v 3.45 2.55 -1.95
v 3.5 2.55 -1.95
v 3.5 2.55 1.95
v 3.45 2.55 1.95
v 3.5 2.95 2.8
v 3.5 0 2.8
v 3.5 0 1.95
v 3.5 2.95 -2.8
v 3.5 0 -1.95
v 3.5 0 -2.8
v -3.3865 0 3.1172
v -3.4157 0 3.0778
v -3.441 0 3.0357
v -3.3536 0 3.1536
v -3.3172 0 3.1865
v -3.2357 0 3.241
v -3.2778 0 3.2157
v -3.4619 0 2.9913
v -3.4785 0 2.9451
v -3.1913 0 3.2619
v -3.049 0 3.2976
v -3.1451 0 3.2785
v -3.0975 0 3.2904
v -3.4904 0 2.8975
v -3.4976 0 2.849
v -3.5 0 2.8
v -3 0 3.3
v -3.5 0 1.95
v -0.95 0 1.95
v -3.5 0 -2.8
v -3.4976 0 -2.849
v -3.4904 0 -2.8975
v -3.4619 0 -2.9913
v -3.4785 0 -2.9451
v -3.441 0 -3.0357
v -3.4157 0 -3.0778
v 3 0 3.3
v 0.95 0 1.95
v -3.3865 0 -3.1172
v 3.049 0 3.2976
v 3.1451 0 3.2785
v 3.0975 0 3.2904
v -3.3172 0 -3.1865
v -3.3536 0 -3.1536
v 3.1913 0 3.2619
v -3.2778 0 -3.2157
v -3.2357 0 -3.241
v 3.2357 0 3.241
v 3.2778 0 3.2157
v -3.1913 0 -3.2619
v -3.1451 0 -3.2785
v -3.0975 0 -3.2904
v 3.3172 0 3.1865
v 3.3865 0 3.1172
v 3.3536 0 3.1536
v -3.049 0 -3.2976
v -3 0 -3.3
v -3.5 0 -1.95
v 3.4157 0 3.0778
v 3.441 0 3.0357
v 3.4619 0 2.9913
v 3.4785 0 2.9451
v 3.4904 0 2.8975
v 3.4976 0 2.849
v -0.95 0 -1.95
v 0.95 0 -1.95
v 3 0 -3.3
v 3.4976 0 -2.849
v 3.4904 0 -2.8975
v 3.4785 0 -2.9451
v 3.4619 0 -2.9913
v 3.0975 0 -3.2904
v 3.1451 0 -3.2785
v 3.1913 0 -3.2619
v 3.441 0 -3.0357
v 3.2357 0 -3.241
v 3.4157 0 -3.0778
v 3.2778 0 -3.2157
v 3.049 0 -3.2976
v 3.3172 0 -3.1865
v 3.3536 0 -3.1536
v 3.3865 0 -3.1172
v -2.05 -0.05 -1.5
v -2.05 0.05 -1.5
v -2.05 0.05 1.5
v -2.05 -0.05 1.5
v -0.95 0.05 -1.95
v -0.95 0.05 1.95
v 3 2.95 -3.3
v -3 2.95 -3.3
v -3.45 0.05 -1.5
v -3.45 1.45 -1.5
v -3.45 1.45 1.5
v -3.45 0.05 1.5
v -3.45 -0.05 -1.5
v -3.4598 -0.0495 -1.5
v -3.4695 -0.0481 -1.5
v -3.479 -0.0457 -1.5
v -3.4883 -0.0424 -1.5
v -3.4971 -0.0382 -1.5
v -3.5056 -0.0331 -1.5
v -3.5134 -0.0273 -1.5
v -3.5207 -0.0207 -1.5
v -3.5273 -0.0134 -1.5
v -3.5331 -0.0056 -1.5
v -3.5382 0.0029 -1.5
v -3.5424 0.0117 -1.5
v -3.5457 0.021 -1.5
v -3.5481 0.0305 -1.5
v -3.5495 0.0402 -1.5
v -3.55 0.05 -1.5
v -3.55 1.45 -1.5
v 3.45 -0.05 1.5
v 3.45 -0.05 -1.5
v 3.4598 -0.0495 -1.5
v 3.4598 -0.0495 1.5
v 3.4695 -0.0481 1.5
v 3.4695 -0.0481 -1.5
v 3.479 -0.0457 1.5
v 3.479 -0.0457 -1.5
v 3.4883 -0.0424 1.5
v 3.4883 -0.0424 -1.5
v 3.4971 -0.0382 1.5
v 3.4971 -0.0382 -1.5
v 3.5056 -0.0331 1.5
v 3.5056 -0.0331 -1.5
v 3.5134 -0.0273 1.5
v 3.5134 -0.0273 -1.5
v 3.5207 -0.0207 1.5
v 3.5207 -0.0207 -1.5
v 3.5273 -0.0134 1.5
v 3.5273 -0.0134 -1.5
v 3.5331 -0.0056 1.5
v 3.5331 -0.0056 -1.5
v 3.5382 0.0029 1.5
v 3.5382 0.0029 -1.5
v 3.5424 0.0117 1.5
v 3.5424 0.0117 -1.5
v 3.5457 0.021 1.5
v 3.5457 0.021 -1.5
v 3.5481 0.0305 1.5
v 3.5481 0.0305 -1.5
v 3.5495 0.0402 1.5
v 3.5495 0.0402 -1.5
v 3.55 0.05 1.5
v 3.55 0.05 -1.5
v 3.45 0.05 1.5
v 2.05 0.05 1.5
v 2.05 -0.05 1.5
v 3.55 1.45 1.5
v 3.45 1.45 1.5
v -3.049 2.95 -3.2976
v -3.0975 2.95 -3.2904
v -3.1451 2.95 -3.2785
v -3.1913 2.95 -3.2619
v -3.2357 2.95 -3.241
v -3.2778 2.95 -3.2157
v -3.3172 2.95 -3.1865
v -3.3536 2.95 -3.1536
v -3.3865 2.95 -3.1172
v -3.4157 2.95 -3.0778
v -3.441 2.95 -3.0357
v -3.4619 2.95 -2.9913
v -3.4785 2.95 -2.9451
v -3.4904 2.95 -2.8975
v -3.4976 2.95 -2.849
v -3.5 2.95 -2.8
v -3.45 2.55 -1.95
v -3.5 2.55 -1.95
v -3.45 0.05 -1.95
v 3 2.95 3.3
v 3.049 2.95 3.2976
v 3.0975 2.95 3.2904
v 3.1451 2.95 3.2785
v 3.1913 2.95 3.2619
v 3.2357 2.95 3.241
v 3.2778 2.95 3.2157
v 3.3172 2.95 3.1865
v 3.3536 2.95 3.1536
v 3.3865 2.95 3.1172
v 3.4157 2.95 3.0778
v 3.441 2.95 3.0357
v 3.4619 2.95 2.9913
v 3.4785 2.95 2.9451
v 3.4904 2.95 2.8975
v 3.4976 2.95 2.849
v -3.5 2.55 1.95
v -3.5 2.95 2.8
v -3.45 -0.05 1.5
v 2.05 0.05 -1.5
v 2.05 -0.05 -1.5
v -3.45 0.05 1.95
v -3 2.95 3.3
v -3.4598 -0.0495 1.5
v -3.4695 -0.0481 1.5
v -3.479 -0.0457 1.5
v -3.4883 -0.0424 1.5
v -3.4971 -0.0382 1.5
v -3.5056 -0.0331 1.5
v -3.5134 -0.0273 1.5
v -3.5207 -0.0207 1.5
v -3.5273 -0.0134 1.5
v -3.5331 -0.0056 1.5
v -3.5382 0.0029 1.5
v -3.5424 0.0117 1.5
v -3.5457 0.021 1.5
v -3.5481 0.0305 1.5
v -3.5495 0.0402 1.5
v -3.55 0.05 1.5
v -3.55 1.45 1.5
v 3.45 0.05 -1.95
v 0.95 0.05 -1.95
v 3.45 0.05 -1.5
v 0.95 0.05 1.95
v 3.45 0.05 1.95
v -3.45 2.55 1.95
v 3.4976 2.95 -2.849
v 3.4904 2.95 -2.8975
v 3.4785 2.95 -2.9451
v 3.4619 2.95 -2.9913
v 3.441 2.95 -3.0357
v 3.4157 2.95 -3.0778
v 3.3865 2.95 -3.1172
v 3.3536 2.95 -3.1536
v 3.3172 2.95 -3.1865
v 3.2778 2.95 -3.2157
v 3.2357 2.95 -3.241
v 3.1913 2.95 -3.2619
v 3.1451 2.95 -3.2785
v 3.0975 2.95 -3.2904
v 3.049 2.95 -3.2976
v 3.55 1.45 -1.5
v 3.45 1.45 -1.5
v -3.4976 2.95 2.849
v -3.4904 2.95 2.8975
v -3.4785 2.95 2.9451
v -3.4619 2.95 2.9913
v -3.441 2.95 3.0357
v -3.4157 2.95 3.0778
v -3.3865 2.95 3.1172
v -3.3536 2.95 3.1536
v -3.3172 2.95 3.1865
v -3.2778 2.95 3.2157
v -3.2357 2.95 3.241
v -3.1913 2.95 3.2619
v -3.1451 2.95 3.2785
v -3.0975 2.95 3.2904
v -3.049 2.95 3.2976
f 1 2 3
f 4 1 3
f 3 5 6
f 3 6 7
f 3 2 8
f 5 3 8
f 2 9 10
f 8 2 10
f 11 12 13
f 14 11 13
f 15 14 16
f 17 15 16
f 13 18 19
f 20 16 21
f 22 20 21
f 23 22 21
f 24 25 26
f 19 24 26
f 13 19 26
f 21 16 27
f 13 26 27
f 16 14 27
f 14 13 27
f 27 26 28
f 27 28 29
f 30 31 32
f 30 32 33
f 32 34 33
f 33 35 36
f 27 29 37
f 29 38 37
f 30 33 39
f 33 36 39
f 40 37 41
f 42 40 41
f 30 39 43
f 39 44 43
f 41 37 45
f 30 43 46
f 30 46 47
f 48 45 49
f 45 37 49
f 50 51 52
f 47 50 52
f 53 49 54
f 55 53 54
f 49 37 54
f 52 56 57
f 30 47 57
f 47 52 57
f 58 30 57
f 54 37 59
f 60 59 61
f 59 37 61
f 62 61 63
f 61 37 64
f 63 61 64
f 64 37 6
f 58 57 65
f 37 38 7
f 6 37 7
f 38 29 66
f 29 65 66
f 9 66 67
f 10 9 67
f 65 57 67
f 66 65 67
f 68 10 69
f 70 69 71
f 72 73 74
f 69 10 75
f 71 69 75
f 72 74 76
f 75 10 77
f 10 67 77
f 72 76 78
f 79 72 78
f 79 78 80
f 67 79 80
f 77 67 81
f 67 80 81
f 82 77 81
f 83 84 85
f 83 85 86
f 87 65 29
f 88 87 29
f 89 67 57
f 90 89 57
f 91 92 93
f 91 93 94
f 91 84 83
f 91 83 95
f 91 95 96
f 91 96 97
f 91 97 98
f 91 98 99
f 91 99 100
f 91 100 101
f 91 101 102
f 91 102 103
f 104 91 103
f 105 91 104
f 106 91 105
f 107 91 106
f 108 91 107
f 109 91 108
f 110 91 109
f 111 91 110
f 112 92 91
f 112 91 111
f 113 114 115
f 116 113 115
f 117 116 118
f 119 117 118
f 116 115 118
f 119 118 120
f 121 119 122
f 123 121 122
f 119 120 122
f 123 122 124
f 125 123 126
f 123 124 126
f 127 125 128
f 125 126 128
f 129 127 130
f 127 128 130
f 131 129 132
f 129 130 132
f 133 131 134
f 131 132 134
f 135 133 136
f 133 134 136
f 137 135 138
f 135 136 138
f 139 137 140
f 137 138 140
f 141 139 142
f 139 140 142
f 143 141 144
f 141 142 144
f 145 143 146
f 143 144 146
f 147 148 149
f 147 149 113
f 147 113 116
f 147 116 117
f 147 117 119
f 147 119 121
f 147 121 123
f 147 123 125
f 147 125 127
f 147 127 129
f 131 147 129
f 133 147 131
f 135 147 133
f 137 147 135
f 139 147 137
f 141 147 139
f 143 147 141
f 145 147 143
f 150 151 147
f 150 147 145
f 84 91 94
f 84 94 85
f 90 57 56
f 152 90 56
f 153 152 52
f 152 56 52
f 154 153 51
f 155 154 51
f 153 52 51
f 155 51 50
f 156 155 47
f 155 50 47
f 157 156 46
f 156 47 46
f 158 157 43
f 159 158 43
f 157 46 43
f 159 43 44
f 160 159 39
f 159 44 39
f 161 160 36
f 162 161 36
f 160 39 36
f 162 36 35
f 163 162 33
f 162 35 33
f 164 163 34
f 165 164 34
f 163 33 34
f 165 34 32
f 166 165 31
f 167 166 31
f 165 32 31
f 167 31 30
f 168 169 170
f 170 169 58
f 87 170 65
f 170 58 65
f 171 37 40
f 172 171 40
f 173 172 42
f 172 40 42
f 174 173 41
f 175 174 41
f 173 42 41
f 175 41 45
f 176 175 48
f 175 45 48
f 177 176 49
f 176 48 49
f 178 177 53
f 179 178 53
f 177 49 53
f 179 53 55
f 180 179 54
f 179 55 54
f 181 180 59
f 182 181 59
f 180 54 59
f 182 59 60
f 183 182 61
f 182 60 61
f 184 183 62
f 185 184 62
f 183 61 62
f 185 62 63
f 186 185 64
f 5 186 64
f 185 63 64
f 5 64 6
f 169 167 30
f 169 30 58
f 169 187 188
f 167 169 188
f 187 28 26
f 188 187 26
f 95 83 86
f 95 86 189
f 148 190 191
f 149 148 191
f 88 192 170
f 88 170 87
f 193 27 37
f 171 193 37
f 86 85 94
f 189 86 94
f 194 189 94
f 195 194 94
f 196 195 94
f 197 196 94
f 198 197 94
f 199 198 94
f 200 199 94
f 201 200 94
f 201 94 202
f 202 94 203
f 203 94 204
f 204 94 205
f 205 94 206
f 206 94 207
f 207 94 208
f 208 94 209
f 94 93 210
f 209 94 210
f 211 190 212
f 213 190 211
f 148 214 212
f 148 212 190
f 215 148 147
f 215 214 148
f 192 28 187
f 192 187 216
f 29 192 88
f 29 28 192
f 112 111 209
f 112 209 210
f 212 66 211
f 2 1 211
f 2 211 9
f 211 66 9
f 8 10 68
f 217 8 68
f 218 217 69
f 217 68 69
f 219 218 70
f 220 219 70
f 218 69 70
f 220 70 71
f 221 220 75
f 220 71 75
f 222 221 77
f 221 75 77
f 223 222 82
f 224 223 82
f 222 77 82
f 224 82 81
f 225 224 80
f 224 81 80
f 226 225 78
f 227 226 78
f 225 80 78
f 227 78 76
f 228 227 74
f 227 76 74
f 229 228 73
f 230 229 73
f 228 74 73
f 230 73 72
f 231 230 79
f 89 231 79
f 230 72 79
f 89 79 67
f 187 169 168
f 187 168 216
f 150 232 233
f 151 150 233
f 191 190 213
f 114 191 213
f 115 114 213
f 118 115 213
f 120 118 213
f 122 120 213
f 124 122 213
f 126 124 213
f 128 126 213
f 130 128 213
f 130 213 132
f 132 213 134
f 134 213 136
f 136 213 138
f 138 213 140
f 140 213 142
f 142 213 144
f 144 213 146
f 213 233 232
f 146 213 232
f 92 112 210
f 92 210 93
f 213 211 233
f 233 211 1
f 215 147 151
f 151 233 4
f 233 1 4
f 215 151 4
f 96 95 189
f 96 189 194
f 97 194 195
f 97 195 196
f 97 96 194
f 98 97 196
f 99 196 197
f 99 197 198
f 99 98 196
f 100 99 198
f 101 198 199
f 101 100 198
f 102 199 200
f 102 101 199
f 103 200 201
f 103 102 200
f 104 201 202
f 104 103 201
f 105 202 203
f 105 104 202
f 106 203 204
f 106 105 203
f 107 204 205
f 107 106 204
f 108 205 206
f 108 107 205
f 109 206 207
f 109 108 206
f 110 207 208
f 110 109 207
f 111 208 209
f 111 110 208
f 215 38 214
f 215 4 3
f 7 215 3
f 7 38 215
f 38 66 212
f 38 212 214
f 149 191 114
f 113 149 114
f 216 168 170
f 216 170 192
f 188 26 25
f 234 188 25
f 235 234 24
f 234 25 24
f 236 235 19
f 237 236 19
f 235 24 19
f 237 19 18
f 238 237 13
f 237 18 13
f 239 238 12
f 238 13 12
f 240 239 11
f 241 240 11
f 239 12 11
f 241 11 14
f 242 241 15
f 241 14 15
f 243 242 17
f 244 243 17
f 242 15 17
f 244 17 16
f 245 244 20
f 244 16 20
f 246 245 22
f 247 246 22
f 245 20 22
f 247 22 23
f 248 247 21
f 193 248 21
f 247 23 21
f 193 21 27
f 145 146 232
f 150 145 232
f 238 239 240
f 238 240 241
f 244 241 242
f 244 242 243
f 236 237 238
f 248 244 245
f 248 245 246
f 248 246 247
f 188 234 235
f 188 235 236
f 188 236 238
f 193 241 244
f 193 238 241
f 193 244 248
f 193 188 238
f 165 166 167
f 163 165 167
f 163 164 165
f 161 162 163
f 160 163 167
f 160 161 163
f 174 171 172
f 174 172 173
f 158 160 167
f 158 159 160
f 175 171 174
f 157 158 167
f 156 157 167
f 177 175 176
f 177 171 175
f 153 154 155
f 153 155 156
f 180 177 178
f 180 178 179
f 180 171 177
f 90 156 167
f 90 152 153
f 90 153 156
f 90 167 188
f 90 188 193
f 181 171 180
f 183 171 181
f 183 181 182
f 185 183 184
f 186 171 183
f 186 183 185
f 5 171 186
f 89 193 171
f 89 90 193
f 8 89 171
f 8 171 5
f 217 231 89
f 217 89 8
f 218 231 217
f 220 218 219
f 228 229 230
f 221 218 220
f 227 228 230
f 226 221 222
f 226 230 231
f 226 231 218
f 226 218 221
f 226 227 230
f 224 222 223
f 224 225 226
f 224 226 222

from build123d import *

# Parameters (mm, degrees)
EXTRUDE_1_DEPTH     = 2.95
SKETCH_2_W          = 2.55
SKETCH_2_H          = 3.9
CUT_EXTRUDE_1_DEPTH = 0.05
SKETCH_6_W          = 3.9
SKETCH_6_H          = 2.55
CUT_EXTRUDE_3_DEPTH = 0.05
EXTRUDE_3_DEPTH     = 3


with BuildPart() as part:
    # 草图1 → 凸台-拉伸1 (new body)
    with BuildSketch(Plane(origin=(0, 0, 0), x_dir=(1, 0, 0), z_dir=(0, 1, 0))):
        with BuildLine():
            Line((-3, -3.3), (3, -3.3))
            ThreePointArc((3, -3.3), (3.353553391, -3.153553391), (3.5, -2.8))
            Line((3.5, -2.8), (3.5, 2.8))
            ThreePointArc((3.5, 2.8), (3.353553391, 3.153553391), (3, 3.3))
            Line((3, 3.3), (-3, 3.3))
            ThreePointArc((-3, 3.3), (-3.353553391, 3.153553391), (-3.5, 2.8))
            Line((-3.5, 2.8), (-3.5, -2.8))
            ThreePointArc((-3.5, -2.8), (-3.353553391, -3.153553391), (-3, -3.3))
        make_face()
    extrude(amount=EXTRUDE_1_DEPTH)

    # 草图2 → 切除-拉伸1 (cut)
    with BuildSketch(Plane.XZ):
        with Locations((-2.225, 0)):
            Rectangle(SKETCH_2_W, SKETCH_2_H)
        with Locations((2.225, 0)):
            Rectangle(SKETCH_2_W, SKETCH_2_H)
    extrude(amount=-CUT_EXTRUDE_1_DEPTH, mode=Mode.SUBTRACT)

    # 草图6 → 切除-拉伸3 (cut)
    with BuildSketch(Plane.ZY.offset(3.5)):
        with Locations((0, 1.275)):
            Rectangle(SKETCH_6_W, SKETCH_6_H)
    cut_extrude_3 = extrude(amount=-CUT_EXTRUDE_3_DEPTH, mode=Mode.SUBTRACT)

    # 镜向3: 切除-拉伸3 across plane
    add(cut_extrude_3.mirror(Plane.ZY), mode=Mode.SUBTRACT)


with BuildPart() as body_2:
    # 草图8 → 凸台-拉伸3 (new body)
    with BuildSketch(Plane(origin=(0, 0, -1.5), x_dir=(-1, 0, 0), z_dir=(0, 0, -1))):
        with BuildLine():
            Line((2.05, 0.05), (2.05, -0.05))
            Line((2.05, -0.05), (3.45, -0.05))
            ThreePointArc((3.45, -0.05), (3.520710678, -0.020710678), (3.55, 0.05))
            Line((3.55, 0.05), (3.55, 1.45))
            Line((3.55, 1.45), (3.45, 1.45))
            Line((3.45, 1.45), (3.45, 0.05))
            Line((3.45, 0.05), (2.05, 0.05))
        make_face()
    extrude_3 = extrude(amount=-EXTRUDE_3_DEPTH)


with BuildPart() as part_1:
    add(part.part)

    # 镜向4: 凸台-拉伸3 across plane
    add(extrude_3.mirror(Plane.ZY))


solid = Compound([body_2.part, part_1.part])
